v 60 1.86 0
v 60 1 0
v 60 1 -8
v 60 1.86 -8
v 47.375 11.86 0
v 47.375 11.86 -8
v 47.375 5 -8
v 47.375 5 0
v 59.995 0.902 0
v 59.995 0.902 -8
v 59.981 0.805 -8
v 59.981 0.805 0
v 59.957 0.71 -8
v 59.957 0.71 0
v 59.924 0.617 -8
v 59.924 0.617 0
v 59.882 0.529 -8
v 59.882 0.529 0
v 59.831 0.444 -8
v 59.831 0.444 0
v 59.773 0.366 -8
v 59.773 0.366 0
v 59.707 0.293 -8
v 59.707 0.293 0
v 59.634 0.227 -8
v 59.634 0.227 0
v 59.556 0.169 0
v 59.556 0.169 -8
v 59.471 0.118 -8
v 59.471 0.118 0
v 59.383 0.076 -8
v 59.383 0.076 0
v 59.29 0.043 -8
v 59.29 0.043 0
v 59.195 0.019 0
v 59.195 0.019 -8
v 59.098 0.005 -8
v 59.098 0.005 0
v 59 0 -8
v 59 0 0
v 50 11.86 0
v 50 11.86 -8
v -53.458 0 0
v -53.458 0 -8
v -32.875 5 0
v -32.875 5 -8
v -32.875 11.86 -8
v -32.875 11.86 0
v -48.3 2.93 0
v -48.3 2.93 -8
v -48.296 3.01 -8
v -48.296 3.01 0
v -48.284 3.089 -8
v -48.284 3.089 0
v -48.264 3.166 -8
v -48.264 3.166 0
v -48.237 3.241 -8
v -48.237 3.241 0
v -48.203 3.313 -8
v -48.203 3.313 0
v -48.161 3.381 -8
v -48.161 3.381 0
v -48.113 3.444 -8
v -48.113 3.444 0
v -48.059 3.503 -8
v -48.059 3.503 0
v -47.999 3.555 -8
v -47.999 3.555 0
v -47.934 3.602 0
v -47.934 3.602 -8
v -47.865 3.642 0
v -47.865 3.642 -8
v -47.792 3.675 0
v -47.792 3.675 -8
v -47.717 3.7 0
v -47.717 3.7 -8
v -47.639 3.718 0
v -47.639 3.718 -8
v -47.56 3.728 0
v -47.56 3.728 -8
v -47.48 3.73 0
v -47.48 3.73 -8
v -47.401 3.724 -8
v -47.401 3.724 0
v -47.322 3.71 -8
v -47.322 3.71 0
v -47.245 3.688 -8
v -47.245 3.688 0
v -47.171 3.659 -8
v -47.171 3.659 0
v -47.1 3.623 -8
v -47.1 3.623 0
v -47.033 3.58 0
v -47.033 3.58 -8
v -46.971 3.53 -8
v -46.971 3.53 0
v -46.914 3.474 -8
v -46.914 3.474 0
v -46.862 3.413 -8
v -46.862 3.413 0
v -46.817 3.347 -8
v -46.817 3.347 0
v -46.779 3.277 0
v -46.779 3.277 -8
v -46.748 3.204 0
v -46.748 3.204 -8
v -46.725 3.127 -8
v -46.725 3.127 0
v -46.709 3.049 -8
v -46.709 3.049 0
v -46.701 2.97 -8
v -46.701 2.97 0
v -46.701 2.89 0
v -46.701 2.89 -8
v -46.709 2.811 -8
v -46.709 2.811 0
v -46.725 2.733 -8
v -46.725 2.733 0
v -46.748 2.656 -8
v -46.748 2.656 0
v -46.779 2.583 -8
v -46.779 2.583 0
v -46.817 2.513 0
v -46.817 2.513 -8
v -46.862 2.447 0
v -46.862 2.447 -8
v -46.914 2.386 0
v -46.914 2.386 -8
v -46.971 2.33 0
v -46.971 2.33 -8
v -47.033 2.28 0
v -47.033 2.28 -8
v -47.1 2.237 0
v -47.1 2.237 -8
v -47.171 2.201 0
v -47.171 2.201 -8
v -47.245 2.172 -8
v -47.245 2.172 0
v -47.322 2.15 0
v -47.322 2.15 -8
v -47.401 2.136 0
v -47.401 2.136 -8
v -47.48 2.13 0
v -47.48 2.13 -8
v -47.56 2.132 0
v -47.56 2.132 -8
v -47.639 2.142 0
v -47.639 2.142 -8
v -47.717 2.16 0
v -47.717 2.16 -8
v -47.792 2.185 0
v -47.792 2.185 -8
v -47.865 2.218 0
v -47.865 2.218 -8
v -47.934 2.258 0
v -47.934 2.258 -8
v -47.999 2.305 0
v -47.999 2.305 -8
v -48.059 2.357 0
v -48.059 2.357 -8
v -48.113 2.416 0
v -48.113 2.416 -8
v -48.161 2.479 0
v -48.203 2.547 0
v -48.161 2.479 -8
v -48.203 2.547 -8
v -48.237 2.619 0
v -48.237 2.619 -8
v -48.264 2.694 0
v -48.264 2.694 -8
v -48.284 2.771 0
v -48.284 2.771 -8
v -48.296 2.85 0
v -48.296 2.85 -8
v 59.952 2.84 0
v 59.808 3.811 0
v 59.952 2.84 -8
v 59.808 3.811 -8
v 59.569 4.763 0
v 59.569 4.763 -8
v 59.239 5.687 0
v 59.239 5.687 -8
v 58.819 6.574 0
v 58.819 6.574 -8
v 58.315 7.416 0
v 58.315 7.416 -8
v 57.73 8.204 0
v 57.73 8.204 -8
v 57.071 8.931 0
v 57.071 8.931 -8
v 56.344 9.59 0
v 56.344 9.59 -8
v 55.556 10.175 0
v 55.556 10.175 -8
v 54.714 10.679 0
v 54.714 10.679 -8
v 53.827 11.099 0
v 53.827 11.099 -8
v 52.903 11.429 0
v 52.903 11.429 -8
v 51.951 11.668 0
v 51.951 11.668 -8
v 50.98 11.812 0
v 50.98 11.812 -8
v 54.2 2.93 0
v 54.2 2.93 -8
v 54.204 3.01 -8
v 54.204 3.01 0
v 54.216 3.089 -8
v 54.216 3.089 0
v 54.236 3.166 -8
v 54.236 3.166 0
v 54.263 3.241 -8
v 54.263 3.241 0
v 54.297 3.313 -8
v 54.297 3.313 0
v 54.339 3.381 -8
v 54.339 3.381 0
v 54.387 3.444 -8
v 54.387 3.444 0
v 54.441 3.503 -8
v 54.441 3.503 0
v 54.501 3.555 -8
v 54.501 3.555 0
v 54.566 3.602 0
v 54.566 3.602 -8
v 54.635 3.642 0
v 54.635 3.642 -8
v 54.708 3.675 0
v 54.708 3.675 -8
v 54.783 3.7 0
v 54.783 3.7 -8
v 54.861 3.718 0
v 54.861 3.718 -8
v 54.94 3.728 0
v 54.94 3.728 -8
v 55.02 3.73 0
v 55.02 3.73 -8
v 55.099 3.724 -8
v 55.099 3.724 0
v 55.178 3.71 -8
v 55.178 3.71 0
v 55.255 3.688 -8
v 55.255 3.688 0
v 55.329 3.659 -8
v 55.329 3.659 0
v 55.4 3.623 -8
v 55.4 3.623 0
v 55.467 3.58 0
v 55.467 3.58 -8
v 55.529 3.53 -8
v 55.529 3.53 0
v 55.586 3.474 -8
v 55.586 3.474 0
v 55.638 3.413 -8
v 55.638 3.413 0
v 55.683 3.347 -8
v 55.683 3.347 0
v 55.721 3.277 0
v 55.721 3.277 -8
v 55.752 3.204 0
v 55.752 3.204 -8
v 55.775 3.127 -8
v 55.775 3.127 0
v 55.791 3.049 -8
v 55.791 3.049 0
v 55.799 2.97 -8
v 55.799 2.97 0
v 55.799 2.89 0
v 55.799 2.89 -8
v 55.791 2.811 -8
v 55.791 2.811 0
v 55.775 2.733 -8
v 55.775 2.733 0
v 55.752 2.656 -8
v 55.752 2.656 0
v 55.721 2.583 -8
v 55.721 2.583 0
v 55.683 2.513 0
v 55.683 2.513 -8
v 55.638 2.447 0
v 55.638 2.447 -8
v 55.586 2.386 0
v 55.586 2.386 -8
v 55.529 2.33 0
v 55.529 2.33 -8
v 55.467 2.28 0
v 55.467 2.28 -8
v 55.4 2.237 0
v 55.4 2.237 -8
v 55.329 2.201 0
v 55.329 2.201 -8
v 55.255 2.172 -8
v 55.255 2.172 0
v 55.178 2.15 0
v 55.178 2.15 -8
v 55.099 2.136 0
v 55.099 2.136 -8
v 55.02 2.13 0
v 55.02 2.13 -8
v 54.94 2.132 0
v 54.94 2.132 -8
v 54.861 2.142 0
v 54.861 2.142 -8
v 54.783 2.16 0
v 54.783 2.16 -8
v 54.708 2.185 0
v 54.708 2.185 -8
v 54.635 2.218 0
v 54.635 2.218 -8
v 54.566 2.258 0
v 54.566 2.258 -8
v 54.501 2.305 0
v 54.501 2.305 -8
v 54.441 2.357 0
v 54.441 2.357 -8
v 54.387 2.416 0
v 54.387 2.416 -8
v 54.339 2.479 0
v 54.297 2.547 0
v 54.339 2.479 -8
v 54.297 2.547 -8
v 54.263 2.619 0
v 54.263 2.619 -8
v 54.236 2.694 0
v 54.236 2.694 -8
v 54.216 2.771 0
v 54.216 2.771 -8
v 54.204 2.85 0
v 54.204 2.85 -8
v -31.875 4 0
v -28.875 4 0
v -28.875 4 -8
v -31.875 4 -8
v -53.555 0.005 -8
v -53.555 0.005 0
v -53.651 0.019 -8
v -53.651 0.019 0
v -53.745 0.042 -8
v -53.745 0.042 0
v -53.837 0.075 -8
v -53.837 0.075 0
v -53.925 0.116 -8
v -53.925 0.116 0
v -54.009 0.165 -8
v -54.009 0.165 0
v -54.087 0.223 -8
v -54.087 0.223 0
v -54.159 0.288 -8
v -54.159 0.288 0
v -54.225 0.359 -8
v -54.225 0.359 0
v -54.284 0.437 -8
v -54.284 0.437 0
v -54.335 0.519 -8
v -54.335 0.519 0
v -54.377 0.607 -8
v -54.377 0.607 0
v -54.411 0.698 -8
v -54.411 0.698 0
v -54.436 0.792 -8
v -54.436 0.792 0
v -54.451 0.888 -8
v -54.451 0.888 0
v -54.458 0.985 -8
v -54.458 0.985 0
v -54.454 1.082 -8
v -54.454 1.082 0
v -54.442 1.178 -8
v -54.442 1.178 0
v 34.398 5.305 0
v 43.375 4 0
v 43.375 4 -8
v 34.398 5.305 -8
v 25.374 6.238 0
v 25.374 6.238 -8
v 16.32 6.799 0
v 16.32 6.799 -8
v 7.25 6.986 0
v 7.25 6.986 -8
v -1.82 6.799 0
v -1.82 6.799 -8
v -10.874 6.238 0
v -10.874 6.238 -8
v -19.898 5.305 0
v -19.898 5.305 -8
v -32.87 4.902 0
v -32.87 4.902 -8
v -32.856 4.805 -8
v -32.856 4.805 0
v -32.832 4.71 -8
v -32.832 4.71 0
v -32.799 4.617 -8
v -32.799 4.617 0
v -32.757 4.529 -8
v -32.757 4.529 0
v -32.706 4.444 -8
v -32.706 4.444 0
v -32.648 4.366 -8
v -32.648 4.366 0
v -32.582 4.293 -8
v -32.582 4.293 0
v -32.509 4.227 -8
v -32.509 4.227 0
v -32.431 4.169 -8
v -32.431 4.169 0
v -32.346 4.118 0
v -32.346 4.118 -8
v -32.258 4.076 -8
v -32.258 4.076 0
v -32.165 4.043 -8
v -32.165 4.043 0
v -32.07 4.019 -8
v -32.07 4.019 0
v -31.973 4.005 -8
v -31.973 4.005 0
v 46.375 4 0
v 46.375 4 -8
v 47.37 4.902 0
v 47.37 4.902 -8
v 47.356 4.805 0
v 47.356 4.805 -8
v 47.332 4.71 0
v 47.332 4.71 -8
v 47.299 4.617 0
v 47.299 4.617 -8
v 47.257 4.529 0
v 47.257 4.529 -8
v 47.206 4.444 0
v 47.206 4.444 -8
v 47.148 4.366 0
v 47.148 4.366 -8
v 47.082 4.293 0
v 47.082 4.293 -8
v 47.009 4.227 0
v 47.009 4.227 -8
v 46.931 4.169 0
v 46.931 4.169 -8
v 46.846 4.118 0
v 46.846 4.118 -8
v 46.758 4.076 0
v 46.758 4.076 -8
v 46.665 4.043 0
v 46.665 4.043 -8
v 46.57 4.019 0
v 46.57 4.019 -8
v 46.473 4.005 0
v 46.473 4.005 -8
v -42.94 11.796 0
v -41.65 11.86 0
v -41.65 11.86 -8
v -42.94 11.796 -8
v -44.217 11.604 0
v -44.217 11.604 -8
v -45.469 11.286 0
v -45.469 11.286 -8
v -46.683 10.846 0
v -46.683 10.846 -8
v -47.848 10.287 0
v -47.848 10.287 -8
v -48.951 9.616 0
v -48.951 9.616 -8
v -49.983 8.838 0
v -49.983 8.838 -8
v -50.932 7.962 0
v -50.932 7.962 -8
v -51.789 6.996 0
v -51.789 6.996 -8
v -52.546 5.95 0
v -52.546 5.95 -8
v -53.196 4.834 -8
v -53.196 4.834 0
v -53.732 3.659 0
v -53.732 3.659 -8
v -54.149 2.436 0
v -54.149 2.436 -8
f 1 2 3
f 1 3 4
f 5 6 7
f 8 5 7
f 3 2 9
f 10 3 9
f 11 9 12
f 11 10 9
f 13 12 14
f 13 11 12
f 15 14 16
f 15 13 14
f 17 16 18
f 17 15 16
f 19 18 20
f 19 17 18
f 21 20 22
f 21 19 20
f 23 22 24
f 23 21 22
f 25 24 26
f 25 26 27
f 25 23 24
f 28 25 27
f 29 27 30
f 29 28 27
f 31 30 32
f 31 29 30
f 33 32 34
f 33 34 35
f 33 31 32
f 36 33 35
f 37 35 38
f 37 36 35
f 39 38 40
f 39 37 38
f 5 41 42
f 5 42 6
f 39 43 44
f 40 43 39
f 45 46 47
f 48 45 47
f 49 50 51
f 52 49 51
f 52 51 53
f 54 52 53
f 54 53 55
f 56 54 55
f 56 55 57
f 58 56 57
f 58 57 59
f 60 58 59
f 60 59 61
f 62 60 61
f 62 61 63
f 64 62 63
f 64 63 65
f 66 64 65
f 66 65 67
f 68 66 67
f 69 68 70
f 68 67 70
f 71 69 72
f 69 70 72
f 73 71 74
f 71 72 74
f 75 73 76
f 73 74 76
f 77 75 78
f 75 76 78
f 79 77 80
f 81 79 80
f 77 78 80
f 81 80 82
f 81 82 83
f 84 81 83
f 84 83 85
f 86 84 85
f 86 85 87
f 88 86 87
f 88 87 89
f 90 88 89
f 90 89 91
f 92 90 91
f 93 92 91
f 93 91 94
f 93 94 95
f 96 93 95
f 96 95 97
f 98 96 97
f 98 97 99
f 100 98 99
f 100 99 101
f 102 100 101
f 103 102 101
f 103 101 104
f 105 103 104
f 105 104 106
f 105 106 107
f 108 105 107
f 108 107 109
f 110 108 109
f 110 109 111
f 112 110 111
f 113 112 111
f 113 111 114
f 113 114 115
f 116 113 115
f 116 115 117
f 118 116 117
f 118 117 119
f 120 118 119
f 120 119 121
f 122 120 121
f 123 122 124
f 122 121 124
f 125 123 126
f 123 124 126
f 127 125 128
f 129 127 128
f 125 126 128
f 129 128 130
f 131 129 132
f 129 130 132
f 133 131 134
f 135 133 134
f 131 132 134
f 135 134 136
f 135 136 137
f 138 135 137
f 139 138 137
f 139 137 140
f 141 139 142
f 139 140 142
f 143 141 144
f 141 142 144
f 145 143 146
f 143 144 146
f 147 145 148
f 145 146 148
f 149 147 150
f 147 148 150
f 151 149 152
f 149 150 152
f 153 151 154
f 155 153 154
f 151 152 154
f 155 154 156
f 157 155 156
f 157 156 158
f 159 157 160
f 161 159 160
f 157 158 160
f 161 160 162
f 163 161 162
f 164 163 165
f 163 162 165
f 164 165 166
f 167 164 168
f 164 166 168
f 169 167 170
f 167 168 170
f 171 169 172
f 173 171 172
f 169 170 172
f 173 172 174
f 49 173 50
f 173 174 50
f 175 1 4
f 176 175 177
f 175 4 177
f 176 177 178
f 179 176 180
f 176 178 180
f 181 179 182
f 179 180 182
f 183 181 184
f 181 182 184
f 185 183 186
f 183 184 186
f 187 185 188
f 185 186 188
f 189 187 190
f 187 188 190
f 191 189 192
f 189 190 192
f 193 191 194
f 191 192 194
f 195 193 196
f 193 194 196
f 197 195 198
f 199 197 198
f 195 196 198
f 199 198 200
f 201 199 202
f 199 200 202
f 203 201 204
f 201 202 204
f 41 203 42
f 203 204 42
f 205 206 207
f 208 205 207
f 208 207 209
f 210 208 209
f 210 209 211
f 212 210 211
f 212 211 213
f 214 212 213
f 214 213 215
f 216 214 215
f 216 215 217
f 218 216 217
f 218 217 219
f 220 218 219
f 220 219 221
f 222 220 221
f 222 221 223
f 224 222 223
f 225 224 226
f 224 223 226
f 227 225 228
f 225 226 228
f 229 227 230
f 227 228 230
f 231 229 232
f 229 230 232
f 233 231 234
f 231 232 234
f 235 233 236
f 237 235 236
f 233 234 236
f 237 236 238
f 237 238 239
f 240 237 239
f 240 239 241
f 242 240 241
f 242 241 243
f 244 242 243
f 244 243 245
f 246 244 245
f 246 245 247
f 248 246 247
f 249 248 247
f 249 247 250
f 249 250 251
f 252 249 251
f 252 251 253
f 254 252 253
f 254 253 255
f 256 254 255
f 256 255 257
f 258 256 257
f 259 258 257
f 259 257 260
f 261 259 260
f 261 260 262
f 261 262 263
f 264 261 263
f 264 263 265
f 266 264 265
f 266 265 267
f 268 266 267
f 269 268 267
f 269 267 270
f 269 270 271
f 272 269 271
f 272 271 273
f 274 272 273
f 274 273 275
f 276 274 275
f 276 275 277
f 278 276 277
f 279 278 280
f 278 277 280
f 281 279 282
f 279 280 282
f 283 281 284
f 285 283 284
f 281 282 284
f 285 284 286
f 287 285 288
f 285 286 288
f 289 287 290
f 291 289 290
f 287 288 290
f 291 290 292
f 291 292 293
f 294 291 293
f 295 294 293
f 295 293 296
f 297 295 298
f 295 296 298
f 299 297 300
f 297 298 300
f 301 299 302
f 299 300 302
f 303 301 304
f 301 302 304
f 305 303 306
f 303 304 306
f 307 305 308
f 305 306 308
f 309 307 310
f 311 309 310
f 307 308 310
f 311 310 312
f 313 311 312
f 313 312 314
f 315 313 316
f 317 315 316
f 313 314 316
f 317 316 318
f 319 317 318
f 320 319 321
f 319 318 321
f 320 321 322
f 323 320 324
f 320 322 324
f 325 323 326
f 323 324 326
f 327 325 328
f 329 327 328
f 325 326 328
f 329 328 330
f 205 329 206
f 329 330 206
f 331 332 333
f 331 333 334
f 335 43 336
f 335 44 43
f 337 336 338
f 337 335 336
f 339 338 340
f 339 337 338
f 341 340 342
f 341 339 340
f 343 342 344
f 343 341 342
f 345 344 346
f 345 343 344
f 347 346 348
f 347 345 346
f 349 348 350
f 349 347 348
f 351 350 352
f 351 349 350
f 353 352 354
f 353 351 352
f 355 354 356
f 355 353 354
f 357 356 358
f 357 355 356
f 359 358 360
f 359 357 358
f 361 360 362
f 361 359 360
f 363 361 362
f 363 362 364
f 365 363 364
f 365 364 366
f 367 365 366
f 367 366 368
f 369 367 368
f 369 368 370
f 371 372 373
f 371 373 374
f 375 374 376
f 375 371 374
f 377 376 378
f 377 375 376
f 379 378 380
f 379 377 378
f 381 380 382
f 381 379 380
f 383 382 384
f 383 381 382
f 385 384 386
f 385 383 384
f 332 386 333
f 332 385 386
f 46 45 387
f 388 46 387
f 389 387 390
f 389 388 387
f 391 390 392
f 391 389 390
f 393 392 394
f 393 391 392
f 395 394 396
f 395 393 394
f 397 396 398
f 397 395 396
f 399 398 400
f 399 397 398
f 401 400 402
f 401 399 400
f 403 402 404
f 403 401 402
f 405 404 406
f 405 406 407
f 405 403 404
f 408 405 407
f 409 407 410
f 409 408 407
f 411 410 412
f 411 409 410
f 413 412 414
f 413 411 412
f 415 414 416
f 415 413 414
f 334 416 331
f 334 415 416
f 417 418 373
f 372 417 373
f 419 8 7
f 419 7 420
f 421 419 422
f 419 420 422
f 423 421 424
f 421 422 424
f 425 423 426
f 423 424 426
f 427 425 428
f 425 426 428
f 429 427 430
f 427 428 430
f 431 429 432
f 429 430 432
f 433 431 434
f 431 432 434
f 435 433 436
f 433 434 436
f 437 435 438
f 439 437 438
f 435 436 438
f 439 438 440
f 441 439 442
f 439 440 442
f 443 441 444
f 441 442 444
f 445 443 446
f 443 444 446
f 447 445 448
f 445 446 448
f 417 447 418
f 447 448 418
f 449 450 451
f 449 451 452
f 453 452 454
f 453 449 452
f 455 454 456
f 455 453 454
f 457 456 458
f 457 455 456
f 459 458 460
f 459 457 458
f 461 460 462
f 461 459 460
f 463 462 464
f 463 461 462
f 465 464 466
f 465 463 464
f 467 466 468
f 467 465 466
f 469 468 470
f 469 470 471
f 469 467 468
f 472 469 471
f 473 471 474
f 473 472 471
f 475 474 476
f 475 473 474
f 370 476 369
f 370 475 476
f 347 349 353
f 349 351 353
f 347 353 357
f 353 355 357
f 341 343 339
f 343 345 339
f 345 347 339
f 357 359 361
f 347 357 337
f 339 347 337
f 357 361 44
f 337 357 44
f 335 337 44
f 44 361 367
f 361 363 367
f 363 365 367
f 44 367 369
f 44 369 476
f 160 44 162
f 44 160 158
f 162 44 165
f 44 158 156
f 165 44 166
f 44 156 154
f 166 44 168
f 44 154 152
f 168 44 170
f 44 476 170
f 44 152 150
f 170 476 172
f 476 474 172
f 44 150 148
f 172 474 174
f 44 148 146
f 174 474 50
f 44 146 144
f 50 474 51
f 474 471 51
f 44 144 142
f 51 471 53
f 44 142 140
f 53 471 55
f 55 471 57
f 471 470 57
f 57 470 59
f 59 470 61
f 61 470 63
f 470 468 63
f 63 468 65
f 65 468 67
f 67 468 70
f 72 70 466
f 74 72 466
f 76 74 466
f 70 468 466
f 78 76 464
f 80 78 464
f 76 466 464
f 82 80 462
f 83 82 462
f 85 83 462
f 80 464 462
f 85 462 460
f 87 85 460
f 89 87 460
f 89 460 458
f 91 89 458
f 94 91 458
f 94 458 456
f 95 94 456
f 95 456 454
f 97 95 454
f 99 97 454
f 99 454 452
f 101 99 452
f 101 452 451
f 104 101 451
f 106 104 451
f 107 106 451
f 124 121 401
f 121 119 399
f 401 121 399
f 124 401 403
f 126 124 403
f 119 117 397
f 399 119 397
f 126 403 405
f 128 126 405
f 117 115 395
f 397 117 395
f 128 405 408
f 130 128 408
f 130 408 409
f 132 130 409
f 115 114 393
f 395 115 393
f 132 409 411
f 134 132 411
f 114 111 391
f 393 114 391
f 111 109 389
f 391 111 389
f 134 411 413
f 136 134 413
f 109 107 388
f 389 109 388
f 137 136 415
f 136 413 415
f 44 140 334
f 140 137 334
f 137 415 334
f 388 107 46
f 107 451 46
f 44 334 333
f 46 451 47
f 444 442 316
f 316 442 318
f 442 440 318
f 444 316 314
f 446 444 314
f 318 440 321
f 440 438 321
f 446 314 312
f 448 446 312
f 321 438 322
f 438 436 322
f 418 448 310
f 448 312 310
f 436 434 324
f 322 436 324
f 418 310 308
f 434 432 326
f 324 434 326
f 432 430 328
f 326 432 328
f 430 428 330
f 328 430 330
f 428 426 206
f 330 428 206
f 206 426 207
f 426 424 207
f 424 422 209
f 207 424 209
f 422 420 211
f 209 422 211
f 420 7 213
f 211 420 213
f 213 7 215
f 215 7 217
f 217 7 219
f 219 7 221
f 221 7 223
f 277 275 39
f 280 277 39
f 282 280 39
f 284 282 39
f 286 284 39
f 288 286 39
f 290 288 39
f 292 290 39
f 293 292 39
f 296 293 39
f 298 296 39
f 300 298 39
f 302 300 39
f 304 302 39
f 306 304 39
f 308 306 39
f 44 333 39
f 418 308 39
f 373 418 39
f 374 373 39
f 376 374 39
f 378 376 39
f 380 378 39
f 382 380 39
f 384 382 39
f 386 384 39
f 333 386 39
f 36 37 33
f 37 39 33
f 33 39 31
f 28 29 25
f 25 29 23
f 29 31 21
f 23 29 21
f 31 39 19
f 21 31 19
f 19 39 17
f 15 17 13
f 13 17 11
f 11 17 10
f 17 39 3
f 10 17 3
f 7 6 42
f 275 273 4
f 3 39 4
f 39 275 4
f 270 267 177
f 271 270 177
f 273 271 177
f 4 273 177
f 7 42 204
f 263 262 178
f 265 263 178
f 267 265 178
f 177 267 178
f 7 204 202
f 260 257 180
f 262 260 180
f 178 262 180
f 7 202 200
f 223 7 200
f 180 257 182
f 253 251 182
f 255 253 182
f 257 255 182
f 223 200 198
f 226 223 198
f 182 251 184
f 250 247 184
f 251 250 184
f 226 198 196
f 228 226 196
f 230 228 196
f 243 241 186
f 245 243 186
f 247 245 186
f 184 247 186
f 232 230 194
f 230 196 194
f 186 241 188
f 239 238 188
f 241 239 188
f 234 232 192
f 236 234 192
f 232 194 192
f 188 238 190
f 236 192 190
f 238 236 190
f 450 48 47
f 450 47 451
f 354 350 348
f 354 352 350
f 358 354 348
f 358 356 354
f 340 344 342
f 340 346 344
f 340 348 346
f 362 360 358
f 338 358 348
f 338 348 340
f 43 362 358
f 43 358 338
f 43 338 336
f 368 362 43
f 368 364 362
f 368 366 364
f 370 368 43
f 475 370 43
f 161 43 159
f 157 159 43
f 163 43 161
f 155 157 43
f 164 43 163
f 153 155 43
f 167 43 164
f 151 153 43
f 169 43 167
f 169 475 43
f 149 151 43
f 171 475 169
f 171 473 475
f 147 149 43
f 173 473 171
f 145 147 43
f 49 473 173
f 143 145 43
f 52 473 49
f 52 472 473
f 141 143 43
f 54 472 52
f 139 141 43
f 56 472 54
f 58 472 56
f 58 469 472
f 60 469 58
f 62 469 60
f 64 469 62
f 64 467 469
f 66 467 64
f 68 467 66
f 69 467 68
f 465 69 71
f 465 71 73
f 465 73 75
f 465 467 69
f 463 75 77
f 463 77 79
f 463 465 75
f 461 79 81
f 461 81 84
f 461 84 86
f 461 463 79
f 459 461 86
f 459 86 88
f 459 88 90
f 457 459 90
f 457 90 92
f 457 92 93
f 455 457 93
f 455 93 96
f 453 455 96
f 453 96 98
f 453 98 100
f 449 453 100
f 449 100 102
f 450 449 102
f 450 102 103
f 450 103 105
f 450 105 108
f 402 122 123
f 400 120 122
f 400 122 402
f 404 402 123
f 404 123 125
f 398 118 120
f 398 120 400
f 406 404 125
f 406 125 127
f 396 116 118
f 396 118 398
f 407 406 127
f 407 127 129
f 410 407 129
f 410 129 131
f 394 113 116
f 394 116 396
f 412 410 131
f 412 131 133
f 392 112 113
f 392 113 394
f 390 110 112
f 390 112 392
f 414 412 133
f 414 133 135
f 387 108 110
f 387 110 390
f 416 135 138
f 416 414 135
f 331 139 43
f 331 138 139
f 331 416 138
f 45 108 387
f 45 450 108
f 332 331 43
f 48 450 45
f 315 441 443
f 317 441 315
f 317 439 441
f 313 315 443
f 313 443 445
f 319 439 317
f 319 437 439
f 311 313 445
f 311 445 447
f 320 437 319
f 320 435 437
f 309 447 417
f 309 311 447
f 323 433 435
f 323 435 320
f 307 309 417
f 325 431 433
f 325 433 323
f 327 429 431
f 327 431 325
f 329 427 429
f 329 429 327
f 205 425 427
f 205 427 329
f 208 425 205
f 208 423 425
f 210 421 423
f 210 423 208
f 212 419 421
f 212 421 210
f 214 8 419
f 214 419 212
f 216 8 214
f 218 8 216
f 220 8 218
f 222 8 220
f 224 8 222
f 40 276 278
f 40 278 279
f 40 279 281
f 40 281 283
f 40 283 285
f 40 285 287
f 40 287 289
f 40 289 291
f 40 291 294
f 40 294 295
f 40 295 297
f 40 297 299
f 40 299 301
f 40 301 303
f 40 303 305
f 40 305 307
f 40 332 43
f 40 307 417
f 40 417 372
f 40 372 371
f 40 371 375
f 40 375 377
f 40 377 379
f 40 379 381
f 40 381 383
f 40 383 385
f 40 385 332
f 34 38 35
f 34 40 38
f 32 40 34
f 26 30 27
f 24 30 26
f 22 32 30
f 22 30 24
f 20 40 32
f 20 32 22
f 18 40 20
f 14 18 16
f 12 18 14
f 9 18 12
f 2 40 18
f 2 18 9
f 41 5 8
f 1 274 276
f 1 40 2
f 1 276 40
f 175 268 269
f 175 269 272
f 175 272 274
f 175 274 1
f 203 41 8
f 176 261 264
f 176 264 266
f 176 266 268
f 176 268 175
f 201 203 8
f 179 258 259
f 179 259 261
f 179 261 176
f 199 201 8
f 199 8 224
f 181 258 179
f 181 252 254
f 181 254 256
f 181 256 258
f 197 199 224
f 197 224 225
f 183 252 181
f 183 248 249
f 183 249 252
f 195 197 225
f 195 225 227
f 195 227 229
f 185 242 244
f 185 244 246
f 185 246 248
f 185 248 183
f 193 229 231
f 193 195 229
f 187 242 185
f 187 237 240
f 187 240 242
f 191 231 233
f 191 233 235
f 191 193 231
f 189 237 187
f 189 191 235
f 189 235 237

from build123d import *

# Parameters (mm, degrees)
MODEL_R            = 0.5
EXTRUDE_1077_DEPTH = 8
FILLET_1_R         = 10
FILLET_2_R         = 1
HOLE_WIZARD_M2_D   = 1.6


with BuildPart() as part:
    # Model → Extrude 1077 (new body)
    with BuildSketch(Plane.XY):
        with BuildLine():
            Line((-32.875, 4), (-32.875, 11.86))
            Line((-32.875, 11.86), (-41.650081081, 11.86))
            ThreePointArc((-41.650081081, 11.86), (-50.430172197, 8.446970324), (-54.6, 0))
            Line((-54.6, 0), (0, 0))
            Line((0, 0), (60, 0))
            Line((60, 0), (60, 11.86))
            Line((60, 11.86), (47.375, 11.86))
            Line((47.375, 11.86), (47.375, 4))
            Line((47.375, 4), (43.375, 4))
            ThreePointArc((43.375, 4), (7.25, 6.986211556), (-28.875, 4))
            Line((-28.875, 4), (-32.875, 4))
        make_face()
        with Locations((-47.5, 2.93)):
            Circle(MODEL_R, mode=Mode.SUBTRACT)
        with Locations((55, 2.93)):
            Circle(MODEL_R, mode=Mode.SUBTRACT)
    extrude(amount=-EXTRUDE_1077_DEPTH)

    # Скругление1
    fillet_1_edges = [part.edges().sort_by_distance(p)[0] for p in [
        (60, 11.86, -4),
    ]]
    fillet(fillet_1_edges, radius=FILLET_1_R)

    # Скругление2
    fillet_2_edges = [part.edges().sort_by_distance(p)[0] for p in [
        (-54.6, 0, -4),
        (-32.875, 4, -4),
        (47.375, 4, -4),
        (60, 0, -4),
    ]]
    fillet(fillet_2_edges, radius=FILLET_2_R)

    # Крепление M2 (through all)
    with Locations(Plane.XY):
        with Locations((-47.5, 2.93), (55, 2.93)):
            Hole(HOLE_WIZARD_M2_D / 2)


solid = part.part
